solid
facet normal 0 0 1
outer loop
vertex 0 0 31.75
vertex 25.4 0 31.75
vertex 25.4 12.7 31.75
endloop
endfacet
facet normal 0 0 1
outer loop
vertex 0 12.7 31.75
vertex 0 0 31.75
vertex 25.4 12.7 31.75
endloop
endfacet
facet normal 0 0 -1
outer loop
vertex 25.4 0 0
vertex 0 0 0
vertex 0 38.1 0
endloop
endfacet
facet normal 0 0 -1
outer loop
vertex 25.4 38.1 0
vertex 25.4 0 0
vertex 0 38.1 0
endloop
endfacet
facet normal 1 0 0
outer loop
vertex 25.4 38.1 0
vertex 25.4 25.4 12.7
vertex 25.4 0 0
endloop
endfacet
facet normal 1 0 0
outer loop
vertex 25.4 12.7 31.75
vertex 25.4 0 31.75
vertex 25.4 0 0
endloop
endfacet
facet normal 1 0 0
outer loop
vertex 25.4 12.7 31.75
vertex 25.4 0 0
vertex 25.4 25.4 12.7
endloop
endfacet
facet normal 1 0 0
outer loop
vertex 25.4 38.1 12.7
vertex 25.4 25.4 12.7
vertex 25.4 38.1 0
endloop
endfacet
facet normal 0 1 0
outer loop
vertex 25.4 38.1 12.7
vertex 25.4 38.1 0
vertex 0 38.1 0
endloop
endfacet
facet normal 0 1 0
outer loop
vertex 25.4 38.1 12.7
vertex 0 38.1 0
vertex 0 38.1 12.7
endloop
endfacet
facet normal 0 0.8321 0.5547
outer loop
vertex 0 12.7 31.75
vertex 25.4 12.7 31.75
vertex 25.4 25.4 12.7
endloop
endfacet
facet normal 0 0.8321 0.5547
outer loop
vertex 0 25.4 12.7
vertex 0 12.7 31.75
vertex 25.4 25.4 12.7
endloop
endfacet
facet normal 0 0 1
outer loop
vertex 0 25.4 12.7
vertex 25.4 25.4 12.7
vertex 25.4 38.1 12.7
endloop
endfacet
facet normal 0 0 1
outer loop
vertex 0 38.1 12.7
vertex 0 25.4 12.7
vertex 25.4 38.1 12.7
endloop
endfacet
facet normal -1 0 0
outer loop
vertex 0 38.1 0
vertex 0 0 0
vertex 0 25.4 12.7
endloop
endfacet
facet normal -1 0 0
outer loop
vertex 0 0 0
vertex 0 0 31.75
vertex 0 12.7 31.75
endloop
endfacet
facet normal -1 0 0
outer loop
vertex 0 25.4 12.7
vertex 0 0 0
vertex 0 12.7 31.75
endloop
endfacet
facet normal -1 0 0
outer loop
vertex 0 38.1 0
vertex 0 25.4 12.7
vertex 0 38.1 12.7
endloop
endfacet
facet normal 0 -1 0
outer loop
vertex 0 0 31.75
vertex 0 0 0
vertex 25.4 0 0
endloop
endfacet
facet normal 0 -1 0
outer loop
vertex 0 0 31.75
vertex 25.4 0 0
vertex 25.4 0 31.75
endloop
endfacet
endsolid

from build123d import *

# Parameters (mm, degrees)
F0_W     = 38.1
F0_H     = 31.75
F1_DEPTH = 25.4
F3_DEPTH = 25.401


with BuildPart() as f1:
    # F0 (on Right) → F1 (new body)
    with BuildSketch(Plane.YZ):
        with Locations((19.05, 15.875)):
            Rectangle(F0_W, F0_H)
    extrude(amount=F1_DEPTH)

    # F2 (on face) → F3 (cut, through all)
    with BuildSketch(Plane.YZ.offset(25.4)):
        Polygon((25.4, 12.7), (38.1, 12.7), (38.1, 31.75), (12.7, 31.75), align=None)
    extrude(amount=-F3_DEPTH, mode=Mode.SUBTRACT)


solid = f1.part
